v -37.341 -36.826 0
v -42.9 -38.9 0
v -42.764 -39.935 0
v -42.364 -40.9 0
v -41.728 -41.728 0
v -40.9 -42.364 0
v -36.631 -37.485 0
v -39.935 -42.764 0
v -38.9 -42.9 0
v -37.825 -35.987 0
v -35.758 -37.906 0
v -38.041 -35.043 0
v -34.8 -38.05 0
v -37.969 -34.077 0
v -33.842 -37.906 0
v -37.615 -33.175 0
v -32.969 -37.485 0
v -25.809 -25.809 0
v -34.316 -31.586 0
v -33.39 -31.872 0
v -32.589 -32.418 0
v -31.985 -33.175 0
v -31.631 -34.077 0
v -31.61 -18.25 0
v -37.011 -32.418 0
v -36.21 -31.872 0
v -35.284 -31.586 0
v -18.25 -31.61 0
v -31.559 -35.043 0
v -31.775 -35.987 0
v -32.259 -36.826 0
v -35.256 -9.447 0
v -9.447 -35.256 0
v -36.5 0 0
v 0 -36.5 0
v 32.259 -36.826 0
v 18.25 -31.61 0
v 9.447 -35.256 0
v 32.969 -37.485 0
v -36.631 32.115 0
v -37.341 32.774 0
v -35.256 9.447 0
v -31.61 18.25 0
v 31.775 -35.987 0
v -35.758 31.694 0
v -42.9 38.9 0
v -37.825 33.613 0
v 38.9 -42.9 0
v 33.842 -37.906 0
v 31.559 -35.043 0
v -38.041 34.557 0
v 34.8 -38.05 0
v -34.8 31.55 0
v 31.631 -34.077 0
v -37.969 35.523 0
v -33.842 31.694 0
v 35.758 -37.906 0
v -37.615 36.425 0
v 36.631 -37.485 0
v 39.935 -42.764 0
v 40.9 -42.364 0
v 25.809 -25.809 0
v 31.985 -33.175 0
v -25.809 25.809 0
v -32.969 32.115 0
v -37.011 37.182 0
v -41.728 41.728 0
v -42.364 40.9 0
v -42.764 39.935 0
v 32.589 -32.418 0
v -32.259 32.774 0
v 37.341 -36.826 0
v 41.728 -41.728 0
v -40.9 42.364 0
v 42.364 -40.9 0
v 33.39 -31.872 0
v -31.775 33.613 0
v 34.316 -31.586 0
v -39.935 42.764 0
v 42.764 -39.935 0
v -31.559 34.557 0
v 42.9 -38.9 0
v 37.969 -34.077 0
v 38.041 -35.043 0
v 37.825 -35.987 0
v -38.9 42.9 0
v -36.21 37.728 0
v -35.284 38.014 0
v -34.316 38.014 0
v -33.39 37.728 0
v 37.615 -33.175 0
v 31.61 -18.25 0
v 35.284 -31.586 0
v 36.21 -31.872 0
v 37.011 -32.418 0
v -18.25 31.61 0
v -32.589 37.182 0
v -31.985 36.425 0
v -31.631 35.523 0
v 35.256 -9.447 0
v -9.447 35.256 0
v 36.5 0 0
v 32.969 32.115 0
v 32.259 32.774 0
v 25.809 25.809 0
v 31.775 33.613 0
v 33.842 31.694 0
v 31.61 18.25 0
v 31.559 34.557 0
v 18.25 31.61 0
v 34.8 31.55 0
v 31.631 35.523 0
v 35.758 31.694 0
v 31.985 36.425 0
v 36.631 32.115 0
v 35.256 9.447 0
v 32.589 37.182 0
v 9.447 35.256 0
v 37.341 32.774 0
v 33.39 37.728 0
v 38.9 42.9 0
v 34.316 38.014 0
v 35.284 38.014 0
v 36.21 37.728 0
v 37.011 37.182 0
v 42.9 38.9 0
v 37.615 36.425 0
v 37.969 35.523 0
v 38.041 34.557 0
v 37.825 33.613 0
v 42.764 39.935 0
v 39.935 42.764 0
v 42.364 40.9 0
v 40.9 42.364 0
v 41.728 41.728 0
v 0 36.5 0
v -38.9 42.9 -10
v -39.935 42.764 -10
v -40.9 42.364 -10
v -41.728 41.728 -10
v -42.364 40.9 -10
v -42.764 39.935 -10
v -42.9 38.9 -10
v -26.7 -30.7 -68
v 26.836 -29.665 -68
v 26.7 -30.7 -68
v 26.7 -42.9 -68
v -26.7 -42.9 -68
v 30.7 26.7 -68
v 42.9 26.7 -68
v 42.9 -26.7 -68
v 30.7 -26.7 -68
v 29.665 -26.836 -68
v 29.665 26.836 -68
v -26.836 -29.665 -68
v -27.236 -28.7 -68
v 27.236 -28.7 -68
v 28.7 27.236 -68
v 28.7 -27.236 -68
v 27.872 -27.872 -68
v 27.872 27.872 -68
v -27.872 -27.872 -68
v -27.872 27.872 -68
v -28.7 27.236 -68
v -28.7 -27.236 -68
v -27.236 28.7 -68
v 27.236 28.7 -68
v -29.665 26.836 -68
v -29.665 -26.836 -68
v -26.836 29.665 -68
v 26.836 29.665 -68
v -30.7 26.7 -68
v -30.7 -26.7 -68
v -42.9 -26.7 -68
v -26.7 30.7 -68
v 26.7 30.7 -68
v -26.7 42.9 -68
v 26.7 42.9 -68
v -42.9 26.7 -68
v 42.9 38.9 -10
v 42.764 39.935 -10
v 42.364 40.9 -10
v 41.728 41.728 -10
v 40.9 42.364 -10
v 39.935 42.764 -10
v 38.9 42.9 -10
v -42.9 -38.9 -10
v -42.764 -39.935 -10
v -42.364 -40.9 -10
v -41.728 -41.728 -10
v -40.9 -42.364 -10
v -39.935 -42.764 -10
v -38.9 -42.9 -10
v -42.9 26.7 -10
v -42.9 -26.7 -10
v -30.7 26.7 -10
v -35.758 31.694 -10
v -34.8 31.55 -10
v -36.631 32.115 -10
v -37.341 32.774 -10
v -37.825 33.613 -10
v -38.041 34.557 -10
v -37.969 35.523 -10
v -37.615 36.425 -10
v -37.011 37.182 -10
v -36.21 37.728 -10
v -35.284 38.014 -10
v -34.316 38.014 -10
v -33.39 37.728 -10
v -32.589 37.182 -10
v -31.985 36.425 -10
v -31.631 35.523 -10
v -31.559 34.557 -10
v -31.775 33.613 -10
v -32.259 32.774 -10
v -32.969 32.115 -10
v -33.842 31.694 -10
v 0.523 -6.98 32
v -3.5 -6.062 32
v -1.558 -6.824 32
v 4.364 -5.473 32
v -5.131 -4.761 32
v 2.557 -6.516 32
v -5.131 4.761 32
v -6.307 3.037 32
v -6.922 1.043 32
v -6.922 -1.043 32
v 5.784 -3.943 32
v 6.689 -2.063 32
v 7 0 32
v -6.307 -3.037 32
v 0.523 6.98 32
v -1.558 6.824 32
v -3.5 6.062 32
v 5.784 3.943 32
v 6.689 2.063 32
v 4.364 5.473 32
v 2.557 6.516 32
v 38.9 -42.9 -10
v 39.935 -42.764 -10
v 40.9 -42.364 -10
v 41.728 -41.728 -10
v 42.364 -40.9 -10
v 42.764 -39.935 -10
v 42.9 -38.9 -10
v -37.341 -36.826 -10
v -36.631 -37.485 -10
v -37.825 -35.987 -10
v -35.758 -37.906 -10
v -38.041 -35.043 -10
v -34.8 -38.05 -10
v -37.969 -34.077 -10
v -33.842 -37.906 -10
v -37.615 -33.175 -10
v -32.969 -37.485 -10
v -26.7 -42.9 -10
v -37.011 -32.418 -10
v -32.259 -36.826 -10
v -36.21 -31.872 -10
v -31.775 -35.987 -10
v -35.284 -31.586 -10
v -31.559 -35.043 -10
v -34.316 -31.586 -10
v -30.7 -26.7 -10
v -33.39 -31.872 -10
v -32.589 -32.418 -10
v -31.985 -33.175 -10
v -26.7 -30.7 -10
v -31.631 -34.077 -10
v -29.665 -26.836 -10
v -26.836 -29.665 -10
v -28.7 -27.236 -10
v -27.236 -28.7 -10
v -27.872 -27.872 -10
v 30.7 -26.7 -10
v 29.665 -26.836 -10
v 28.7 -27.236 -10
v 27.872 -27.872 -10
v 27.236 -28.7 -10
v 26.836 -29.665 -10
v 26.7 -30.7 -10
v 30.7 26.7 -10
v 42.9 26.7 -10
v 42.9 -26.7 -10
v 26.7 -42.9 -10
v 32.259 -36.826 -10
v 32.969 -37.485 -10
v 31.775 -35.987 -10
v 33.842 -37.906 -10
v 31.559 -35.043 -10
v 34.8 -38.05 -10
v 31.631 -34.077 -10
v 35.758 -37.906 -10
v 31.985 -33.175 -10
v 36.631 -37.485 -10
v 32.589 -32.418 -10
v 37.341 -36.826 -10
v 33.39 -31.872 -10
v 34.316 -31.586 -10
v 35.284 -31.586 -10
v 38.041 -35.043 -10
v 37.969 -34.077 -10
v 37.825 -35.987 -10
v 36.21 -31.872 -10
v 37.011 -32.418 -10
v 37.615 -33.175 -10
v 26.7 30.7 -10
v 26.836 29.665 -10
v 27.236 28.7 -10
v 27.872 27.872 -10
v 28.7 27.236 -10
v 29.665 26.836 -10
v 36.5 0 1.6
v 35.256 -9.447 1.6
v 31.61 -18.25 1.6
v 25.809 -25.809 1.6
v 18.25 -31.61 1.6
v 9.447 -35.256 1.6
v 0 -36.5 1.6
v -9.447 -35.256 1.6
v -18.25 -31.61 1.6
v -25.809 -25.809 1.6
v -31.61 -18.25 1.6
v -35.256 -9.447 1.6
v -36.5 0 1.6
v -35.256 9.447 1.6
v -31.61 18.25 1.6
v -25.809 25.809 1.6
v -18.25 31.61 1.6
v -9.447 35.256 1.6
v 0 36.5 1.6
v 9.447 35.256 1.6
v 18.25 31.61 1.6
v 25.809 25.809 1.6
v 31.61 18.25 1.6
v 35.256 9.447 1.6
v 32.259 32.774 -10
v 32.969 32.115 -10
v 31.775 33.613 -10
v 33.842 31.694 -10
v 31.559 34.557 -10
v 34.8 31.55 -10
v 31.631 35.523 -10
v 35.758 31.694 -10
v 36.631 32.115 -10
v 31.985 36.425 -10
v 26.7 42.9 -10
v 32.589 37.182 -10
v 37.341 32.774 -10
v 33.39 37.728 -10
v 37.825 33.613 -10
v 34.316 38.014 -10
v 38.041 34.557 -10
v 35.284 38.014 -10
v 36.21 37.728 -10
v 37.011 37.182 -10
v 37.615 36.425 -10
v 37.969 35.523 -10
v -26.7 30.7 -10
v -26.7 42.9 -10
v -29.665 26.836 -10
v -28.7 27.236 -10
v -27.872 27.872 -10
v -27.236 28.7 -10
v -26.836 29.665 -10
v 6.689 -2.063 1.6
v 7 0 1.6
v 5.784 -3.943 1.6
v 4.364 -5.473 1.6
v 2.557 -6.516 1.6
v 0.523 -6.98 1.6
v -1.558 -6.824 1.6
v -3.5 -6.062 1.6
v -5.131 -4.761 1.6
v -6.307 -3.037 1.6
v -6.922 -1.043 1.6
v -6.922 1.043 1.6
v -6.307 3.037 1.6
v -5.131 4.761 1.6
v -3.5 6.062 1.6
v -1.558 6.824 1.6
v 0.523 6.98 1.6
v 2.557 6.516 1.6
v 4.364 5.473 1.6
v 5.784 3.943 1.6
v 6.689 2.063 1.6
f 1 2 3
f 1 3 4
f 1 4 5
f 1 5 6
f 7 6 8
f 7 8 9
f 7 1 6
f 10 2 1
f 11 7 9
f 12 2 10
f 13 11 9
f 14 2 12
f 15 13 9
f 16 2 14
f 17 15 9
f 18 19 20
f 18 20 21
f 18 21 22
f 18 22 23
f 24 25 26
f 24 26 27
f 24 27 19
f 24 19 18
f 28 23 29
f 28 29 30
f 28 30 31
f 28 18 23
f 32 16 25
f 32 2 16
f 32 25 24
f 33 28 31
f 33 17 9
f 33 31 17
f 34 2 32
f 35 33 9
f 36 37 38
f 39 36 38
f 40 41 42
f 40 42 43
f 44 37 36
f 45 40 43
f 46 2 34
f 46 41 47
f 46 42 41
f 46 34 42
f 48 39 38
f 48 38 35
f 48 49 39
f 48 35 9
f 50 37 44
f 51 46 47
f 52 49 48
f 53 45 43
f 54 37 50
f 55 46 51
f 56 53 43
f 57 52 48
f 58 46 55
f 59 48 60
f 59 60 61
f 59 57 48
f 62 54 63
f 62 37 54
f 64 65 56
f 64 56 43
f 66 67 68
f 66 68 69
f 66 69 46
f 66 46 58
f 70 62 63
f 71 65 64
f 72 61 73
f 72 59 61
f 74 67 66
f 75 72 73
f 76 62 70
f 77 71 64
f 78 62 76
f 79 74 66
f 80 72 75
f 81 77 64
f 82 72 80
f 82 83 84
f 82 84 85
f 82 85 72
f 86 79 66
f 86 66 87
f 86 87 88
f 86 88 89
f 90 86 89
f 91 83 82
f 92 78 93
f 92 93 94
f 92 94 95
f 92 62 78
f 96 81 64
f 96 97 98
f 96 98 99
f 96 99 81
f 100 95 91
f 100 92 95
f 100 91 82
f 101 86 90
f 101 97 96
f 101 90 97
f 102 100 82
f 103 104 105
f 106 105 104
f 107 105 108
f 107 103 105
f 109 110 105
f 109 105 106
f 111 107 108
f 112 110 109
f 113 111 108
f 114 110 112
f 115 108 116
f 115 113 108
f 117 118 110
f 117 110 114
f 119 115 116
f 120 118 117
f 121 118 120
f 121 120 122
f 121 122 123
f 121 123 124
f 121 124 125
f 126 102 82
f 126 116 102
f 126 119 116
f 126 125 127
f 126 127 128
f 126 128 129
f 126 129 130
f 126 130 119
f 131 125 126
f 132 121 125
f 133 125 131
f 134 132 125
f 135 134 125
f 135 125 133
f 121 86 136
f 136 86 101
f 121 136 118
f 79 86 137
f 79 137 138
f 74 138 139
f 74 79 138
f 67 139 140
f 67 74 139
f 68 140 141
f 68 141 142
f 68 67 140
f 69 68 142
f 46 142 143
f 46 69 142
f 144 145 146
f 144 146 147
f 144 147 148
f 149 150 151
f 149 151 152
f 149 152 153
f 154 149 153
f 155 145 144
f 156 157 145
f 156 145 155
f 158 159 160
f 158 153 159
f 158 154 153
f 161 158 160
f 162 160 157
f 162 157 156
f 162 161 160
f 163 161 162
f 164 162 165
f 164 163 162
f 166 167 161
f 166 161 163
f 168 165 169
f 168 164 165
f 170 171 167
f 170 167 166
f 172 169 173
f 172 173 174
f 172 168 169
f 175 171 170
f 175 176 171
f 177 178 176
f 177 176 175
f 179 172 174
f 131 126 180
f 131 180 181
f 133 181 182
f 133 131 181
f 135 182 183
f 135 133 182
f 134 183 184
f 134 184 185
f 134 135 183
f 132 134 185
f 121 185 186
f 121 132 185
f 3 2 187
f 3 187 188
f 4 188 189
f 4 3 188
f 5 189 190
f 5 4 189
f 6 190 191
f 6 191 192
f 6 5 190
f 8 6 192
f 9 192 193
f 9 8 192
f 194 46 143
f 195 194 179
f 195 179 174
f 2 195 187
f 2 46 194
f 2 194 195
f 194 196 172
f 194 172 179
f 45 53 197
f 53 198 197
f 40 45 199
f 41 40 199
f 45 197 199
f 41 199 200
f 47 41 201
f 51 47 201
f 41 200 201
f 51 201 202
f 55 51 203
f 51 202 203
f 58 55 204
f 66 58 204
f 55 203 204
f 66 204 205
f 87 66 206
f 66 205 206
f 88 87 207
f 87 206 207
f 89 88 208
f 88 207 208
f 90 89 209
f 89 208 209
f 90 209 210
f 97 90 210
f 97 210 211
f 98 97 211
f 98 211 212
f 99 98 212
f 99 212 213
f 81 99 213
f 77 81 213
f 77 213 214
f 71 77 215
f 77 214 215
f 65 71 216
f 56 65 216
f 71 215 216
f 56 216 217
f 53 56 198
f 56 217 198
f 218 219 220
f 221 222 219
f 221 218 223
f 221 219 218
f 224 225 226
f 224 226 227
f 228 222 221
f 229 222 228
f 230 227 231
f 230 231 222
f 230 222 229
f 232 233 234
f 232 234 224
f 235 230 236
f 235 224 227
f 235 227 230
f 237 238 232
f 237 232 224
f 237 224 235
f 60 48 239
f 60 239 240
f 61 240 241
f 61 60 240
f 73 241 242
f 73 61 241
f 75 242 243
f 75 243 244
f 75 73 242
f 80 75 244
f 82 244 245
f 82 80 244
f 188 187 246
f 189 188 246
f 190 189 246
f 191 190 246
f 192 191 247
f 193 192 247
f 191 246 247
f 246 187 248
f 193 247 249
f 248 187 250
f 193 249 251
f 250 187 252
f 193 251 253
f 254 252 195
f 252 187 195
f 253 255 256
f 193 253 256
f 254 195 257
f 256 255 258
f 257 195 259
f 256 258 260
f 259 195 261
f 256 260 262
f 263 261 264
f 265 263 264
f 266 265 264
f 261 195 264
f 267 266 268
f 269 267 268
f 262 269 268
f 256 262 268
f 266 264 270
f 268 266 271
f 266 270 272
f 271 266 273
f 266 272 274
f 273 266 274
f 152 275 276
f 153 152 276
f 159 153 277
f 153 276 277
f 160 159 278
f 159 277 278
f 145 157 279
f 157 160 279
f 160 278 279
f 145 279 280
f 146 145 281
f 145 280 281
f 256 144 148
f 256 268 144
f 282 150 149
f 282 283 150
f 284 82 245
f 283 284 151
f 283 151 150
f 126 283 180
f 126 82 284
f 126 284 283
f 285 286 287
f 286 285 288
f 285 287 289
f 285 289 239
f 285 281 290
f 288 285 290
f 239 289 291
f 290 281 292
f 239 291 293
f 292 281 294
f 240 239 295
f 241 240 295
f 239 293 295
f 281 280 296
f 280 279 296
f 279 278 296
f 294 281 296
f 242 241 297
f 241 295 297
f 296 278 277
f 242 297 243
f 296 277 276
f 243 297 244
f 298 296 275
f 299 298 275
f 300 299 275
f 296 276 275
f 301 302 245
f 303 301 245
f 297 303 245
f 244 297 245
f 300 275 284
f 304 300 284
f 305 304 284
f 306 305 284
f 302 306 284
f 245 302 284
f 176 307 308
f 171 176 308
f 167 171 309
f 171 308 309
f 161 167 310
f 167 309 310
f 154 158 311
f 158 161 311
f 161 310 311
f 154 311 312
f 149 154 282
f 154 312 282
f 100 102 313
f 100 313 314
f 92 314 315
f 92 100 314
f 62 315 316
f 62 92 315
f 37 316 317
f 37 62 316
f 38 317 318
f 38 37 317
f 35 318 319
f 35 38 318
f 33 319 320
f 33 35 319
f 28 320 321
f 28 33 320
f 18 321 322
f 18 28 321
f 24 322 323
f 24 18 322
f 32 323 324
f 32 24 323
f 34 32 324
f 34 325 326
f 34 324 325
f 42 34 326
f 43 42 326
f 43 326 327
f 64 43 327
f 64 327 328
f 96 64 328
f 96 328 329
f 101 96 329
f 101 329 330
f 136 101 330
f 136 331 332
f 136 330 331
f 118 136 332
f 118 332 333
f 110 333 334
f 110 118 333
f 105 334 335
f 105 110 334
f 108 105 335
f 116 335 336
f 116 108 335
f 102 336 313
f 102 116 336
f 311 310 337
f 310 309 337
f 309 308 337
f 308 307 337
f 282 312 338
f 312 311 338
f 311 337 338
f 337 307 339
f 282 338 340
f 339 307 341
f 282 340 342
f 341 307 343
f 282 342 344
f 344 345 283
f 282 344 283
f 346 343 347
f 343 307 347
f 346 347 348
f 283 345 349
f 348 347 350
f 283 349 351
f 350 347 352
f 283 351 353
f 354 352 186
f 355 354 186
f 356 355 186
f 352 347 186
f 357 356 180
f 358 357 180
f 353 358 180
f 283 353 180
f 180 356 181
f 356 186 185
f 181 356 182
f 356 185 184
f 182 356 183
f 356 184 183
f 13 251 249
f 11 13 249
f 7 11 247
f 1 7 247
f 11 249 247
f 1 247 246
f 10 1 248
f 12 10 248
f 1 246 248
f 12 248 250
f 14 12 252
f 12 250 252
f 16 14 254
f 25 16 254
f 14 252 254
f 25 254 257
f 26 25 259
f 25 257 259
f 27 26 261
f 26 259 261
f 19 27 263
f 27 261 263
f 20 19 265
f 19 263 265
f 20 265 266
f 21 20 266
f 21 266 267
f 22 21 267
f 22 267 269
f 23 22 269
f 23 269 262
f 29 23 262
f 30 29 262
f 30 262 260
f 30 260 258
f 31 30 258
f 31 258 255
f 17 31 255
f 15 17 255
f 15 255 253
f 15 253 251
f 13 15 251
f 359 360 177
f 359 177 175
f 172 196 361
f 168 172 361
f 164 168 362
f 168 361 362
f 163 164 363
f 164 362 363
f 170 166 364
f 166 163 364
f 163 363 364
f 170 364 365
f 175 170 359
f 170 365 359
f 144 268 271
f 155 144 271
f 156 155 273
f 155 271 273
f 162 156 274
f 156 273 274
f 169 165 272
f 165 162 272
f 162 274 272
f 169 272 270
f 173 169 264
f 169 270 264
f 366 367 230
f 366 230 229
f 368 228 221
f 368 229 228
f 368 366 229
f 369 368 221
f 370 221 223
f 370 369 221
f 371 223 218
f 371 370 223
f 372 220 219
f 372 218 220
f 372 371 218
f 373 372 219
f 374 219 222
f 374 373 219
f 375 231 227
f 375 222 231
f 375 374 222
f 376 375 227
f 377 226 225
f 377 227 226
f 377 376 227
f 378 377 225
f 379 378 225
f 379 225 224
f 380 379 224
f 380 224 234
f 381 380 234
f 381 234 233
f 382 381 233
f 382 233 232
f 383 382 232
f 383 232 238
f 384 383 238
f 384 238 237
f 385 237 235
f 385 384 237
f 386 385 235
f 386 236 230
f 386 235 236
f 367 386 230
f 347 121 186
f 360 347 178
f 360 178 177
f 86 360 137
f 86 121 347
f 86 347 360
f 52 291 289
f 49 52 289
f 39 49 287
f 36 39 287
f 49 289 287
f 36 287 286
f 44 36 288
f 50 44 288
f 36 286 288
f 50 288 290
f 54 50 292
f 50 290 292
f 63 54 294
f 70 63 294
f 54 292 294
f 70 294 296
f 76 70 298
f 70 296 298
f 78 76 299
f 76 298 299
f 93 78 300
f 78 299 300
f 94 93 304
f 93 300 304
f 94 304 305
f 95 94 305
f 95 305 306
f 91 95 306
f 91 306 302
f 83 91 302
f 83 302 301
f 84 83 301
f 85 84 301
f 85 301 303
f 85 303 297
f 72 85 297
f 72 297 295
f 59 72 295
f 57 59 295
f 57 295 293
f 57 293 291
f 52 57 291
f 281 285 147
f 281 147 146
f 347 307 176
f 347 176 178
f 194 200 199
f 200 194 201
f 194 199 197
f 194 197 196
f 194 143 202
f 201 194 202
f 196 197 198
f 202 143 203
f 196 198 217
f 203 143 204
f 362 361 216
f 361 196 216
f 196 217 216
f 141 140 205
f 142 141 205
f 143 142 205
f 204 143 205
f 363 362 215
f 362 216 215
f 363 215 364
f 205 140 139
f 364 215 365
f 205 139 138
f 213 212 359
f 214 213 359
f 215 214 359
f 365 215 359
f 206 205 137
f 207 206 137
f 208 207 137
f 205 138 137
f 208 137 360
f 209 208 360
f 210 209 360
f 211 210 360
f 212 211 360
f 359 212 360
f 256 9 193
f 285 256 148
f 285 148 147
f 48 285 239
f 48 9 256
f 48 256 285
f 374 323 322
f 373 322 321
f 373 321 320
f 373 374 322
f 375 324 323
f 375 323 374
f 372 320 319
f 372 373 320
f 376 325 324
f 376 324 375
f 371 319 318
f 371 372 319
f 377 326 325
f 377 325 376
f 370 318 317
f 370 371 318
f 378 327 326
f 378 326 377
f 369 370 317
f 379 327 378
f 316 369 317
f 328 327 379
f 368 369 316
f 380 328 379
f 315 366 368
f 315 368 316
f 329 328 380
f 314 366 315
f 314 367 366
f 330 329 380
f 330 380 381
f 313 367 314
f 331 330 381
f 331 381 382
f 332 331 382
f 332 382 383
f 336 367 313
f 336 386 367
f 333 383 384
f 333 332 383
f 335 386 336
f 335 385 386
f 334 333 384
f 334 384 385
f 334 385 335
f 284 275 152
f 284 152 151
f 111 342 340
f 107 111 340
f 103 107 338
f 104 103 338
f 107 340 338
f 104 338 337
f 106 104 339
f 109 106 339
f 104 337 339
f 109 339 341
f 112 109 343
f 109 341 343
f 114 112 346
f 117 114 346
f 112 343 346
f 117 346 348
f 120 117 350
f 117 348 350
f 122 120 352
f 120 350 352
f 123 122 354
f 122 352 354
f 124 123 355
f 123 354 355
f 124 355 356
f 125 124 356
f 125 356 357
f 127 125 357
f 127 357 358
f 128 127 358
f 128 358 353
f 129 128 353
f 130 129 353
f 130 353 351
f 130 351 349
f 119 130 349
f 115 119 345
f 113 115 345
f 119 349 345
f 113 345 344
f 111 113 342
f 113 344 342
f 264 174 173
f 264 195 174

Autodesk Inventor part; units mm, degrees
ref_plane "YZ Plane" through (0, 0, 0) normal (1, 0, 0) x (0, 1, 0)
ref_plane "XZ Plane" through (0, 0, 0) normal (0, 1, 0) x (-1, 0, 0)
ref_plane "XY Plane" through (0, 0, 0) normal (0, 0, 1) x (1, 0, 0)
sketch "Skizze1" plane through (0, 0, 0) normal (0, 0, 1) x (1, 0, 0)
  line L0 (-38.9, -42.9) -> (38.9, -42.9)
  line L1 (42.9, -38.9) -> (42.9, 38.9)
  line L2 (38.9, 42.9) -> (-38.9, 42.9)
  line L3 (-42.9, 38.9) -> (-42.9, -38.9)
  line L4 (-42.9, -42.9) -> (42.9, 42.9) construction
  line L5 (42.9, -42.9) -> (-42.9, 42.9) construction
  arc A0 (42.9, 38.9) -> (38.9, 42.9) centre (38.9, 38.9) ccw
  arc A1 (38.9, -42.9) -> (42.9, -38.9) centre (38.9, -38.9) ccw
  arc A2 (-42.9, -38.9) -> (-38.9, -42.9) centre (-38.9, -38.9) ccw
  arc A3 (-38.9, 42.9) -> (-42.9, 38.9) centre (-38.9, 38.9) ccw
  point P0 (0, 0)
  dimension "d0" = 4
  dimension "d1" = 85.8
extrude "Extrusion1" add sketch "Skizze1" against normal blind 10
sketch "Skizze2" plane through (0, 0, 0) normal (0, 0, 1) x (1, 0, 0)
  circle A0 centre (0, 0) radius 36.5
  dimension "d4" = 73
extrude "Extrusion2" add sketch "Skizze2" along normal blind 1.6
sketch "Skizze3" plane through (0, 0, -10) normal (0, 0, -1) x (-1, 0, 0)
  line L0 (-42.9, 38.9) -> (-42.9, -38.9) projected
  arc A0 (-42.9, -38.9) -> (-38.9, -42.9) centre (-38.9, -38.9) ccw projected
  line L1 (-38.9, -42.9) -> (38.9, -42.9) projected
  arc A1 (38.9, -42.9) -> (42.9, -38.9) centre (38.9, -38.9) ccw projected
  line L2 (42.9, -38.9) -> (42.9, 38.9) projected
  arc A2 (42.9, 38.9) -> (38.9, 42.9) centre (38.9, 38.9) ccw projected
  line L3 (38.9, 42.9) -> (-38.9, 42.9) projected
  arc A3 (-38.9, 42.9) -> (-42.9, 38.9) centre (-38.9, 38.9) ccw projected
  line L4 (42.9, -26.7) -> (30.7, -26.7)
  line L5 (26.7, -30.7) -> (26.7, -42.9)
  arc A4 (30.7, -26.7) -> (26.7, -30.7) centre (30.7, -30.7) ccw
  line L6 (38.9, -38.9) -> (-38.9, 38.9) construction
  circle A5 centre (34.8, -34.8) radius 8.1 construction
  line L7 (38.9, 38.9) -> (-38.9, -38.9) construction
  line L8 (34.8, -34.8) -> (-34.8, -34.8) construction
  line L9 (42.9, -38.9) -> (42.9, 38.9) projected
  line L10 (42.9, -26.7) -> (42.9, -38.9)
  line L11 (-38.9, -42.9) -> (38.9, -42.9) projected
  line L12 (26.7, -42.9) -> (38.9, -42.9)
  arc A6 (38.9, -42.9) -> (42.9, -38.9) centre (38.9, -38.9) ccw
  arc A7 (42.9, 38.9) -> (38.9, 42.9) centre (38.9, 38.9) ccw
  line L13 (42.9, 26.7) -> (42.9, 38.9)
  line L14 (30.7, 26.7) -> (42.9, 26.7)
  arc A8 (26.7, 30.7) -> (30.7, 26.7) centre (30.7, 30.7) ccw
  line L15 (26.7, 42.9) -> (26.7, 30.7)
  line L16 (26.7, 42.9) -> (38.9, 42.9)
  arc A9 (-38.9, 42.9) -> (-42.9, 38.9) centre (-38.9, 38.9) ccw
  line L17 (-26.7, 42.9) -> (-38.9, 42.9)
  line L18 (-26.7, 30.7) -> (-26.7, 42.9)
  arc A10 (-30.7, 26.7) -> (-26.7, 30.7) centre (-30.7, 30.7) ccw
  line L19 (-42.9, 26.7) -> (-30.7, 26.7)
  line L20 (-42.9, 26.7) -> (-42.9, 38.9)
  arc A11 (-42.9, -38.9) -> (-38.9, -42.9) centre (-38.9, -38.9) ccw
  line L21 (-42.9, -26.7) -> (-42.9, -38.9)
  line L22 (-30.7, -26.7) -> (-42.9, -26.7)
  arc A12 (-26.7, -30.7) -> (-30.7, -26.7) centre (-30.7, -30.7) ccw
  line L23 (-26.7, -42.9) -> (-26.7, -30.7)
  line L24 (-26.7, -42.9) -> (-38.9, -42.9)
  point P0 (0, 0)
  dimension "d7" = 4
  dimension "d8" = 69.6
  dimension "d11" = 360
extrude "Extrusion3" add sketch "Skizze3" along normal blind 58 contours L19 A10 L18 L3 L15 A8 L14 L2 L4 A4 L5 L1 L23 A12 L22 L0
sketch "Skizze4" plane through (0, 0, 0) normal (0, 0, 1) x (1, 0, 0)
  circle A0 centre (0, 0) radius 36.5 projected
  line L0 (42.9, 38.9) -> (42.9, -38.9) projected
  arc A1 (42.9, 38.9) -> (38.9, 42.9) centre (38.9, 38.9) ccw projected
  line L1 (-38.9, 42.9) -> (38.9, 42.9) projected
  arc A2 (-38.9, 42.9) -> (-42.9, 38.9) centre (-38.9, 38.9) ccw projected
  line L2 (-42.9, -38.9) -> (-42.9, 38.9) projected
  arc A3 (-42.9, -38.9) -> (-38.9, -42.9) centre (-38.9, -38.9) ccw projected
  line L3 (38.9, -42.9) -> (-38.9, -42.9) projected
  arc A4 (38.9, -42.9) -> (42.9, -38.9) centre (38.9, -38.9) ccw projected
  line L4 (38.9, -38.9) -> (-38.9, 38.9) construction
  line L5 (-34.8, 34.8) -> (34.8, 34.8) construction
  line L6 (34.8, 34.8) -> (34.8, -34.8) construction
  line L7 (34.8, -34.8) -> (-34.8, -34.8) construction
  line L8 (-34.8, -34.8) -> (-34.8, 34.8) construction
  line L9 (-34.8, 34.8) -> (34.8, -34.8) construction
  line L10 (34.8, 34.8) -> (-34.8, -34.8) construction
  dimension "d15" = 69.6
hole "Bohrung1" at (34.8, 34.8, 0) at (-34.8, 34.8, 0) at (-34.8, -34.8, 0) at (34.8, -34.8, 0) direction (0, 0, -1) diameter 6.5 end through all
sketch "Skizze5" plane through (0, 0, 1.6) normal (0, 0, 1) x (1, 0, 0)
  circle A0 centre (0, 0) radius 7
  dimension "d23" = 14
extrude "Extrusion4" add sketch "Skizze5" along normal blind 30.4
properties part number "Nema34"
